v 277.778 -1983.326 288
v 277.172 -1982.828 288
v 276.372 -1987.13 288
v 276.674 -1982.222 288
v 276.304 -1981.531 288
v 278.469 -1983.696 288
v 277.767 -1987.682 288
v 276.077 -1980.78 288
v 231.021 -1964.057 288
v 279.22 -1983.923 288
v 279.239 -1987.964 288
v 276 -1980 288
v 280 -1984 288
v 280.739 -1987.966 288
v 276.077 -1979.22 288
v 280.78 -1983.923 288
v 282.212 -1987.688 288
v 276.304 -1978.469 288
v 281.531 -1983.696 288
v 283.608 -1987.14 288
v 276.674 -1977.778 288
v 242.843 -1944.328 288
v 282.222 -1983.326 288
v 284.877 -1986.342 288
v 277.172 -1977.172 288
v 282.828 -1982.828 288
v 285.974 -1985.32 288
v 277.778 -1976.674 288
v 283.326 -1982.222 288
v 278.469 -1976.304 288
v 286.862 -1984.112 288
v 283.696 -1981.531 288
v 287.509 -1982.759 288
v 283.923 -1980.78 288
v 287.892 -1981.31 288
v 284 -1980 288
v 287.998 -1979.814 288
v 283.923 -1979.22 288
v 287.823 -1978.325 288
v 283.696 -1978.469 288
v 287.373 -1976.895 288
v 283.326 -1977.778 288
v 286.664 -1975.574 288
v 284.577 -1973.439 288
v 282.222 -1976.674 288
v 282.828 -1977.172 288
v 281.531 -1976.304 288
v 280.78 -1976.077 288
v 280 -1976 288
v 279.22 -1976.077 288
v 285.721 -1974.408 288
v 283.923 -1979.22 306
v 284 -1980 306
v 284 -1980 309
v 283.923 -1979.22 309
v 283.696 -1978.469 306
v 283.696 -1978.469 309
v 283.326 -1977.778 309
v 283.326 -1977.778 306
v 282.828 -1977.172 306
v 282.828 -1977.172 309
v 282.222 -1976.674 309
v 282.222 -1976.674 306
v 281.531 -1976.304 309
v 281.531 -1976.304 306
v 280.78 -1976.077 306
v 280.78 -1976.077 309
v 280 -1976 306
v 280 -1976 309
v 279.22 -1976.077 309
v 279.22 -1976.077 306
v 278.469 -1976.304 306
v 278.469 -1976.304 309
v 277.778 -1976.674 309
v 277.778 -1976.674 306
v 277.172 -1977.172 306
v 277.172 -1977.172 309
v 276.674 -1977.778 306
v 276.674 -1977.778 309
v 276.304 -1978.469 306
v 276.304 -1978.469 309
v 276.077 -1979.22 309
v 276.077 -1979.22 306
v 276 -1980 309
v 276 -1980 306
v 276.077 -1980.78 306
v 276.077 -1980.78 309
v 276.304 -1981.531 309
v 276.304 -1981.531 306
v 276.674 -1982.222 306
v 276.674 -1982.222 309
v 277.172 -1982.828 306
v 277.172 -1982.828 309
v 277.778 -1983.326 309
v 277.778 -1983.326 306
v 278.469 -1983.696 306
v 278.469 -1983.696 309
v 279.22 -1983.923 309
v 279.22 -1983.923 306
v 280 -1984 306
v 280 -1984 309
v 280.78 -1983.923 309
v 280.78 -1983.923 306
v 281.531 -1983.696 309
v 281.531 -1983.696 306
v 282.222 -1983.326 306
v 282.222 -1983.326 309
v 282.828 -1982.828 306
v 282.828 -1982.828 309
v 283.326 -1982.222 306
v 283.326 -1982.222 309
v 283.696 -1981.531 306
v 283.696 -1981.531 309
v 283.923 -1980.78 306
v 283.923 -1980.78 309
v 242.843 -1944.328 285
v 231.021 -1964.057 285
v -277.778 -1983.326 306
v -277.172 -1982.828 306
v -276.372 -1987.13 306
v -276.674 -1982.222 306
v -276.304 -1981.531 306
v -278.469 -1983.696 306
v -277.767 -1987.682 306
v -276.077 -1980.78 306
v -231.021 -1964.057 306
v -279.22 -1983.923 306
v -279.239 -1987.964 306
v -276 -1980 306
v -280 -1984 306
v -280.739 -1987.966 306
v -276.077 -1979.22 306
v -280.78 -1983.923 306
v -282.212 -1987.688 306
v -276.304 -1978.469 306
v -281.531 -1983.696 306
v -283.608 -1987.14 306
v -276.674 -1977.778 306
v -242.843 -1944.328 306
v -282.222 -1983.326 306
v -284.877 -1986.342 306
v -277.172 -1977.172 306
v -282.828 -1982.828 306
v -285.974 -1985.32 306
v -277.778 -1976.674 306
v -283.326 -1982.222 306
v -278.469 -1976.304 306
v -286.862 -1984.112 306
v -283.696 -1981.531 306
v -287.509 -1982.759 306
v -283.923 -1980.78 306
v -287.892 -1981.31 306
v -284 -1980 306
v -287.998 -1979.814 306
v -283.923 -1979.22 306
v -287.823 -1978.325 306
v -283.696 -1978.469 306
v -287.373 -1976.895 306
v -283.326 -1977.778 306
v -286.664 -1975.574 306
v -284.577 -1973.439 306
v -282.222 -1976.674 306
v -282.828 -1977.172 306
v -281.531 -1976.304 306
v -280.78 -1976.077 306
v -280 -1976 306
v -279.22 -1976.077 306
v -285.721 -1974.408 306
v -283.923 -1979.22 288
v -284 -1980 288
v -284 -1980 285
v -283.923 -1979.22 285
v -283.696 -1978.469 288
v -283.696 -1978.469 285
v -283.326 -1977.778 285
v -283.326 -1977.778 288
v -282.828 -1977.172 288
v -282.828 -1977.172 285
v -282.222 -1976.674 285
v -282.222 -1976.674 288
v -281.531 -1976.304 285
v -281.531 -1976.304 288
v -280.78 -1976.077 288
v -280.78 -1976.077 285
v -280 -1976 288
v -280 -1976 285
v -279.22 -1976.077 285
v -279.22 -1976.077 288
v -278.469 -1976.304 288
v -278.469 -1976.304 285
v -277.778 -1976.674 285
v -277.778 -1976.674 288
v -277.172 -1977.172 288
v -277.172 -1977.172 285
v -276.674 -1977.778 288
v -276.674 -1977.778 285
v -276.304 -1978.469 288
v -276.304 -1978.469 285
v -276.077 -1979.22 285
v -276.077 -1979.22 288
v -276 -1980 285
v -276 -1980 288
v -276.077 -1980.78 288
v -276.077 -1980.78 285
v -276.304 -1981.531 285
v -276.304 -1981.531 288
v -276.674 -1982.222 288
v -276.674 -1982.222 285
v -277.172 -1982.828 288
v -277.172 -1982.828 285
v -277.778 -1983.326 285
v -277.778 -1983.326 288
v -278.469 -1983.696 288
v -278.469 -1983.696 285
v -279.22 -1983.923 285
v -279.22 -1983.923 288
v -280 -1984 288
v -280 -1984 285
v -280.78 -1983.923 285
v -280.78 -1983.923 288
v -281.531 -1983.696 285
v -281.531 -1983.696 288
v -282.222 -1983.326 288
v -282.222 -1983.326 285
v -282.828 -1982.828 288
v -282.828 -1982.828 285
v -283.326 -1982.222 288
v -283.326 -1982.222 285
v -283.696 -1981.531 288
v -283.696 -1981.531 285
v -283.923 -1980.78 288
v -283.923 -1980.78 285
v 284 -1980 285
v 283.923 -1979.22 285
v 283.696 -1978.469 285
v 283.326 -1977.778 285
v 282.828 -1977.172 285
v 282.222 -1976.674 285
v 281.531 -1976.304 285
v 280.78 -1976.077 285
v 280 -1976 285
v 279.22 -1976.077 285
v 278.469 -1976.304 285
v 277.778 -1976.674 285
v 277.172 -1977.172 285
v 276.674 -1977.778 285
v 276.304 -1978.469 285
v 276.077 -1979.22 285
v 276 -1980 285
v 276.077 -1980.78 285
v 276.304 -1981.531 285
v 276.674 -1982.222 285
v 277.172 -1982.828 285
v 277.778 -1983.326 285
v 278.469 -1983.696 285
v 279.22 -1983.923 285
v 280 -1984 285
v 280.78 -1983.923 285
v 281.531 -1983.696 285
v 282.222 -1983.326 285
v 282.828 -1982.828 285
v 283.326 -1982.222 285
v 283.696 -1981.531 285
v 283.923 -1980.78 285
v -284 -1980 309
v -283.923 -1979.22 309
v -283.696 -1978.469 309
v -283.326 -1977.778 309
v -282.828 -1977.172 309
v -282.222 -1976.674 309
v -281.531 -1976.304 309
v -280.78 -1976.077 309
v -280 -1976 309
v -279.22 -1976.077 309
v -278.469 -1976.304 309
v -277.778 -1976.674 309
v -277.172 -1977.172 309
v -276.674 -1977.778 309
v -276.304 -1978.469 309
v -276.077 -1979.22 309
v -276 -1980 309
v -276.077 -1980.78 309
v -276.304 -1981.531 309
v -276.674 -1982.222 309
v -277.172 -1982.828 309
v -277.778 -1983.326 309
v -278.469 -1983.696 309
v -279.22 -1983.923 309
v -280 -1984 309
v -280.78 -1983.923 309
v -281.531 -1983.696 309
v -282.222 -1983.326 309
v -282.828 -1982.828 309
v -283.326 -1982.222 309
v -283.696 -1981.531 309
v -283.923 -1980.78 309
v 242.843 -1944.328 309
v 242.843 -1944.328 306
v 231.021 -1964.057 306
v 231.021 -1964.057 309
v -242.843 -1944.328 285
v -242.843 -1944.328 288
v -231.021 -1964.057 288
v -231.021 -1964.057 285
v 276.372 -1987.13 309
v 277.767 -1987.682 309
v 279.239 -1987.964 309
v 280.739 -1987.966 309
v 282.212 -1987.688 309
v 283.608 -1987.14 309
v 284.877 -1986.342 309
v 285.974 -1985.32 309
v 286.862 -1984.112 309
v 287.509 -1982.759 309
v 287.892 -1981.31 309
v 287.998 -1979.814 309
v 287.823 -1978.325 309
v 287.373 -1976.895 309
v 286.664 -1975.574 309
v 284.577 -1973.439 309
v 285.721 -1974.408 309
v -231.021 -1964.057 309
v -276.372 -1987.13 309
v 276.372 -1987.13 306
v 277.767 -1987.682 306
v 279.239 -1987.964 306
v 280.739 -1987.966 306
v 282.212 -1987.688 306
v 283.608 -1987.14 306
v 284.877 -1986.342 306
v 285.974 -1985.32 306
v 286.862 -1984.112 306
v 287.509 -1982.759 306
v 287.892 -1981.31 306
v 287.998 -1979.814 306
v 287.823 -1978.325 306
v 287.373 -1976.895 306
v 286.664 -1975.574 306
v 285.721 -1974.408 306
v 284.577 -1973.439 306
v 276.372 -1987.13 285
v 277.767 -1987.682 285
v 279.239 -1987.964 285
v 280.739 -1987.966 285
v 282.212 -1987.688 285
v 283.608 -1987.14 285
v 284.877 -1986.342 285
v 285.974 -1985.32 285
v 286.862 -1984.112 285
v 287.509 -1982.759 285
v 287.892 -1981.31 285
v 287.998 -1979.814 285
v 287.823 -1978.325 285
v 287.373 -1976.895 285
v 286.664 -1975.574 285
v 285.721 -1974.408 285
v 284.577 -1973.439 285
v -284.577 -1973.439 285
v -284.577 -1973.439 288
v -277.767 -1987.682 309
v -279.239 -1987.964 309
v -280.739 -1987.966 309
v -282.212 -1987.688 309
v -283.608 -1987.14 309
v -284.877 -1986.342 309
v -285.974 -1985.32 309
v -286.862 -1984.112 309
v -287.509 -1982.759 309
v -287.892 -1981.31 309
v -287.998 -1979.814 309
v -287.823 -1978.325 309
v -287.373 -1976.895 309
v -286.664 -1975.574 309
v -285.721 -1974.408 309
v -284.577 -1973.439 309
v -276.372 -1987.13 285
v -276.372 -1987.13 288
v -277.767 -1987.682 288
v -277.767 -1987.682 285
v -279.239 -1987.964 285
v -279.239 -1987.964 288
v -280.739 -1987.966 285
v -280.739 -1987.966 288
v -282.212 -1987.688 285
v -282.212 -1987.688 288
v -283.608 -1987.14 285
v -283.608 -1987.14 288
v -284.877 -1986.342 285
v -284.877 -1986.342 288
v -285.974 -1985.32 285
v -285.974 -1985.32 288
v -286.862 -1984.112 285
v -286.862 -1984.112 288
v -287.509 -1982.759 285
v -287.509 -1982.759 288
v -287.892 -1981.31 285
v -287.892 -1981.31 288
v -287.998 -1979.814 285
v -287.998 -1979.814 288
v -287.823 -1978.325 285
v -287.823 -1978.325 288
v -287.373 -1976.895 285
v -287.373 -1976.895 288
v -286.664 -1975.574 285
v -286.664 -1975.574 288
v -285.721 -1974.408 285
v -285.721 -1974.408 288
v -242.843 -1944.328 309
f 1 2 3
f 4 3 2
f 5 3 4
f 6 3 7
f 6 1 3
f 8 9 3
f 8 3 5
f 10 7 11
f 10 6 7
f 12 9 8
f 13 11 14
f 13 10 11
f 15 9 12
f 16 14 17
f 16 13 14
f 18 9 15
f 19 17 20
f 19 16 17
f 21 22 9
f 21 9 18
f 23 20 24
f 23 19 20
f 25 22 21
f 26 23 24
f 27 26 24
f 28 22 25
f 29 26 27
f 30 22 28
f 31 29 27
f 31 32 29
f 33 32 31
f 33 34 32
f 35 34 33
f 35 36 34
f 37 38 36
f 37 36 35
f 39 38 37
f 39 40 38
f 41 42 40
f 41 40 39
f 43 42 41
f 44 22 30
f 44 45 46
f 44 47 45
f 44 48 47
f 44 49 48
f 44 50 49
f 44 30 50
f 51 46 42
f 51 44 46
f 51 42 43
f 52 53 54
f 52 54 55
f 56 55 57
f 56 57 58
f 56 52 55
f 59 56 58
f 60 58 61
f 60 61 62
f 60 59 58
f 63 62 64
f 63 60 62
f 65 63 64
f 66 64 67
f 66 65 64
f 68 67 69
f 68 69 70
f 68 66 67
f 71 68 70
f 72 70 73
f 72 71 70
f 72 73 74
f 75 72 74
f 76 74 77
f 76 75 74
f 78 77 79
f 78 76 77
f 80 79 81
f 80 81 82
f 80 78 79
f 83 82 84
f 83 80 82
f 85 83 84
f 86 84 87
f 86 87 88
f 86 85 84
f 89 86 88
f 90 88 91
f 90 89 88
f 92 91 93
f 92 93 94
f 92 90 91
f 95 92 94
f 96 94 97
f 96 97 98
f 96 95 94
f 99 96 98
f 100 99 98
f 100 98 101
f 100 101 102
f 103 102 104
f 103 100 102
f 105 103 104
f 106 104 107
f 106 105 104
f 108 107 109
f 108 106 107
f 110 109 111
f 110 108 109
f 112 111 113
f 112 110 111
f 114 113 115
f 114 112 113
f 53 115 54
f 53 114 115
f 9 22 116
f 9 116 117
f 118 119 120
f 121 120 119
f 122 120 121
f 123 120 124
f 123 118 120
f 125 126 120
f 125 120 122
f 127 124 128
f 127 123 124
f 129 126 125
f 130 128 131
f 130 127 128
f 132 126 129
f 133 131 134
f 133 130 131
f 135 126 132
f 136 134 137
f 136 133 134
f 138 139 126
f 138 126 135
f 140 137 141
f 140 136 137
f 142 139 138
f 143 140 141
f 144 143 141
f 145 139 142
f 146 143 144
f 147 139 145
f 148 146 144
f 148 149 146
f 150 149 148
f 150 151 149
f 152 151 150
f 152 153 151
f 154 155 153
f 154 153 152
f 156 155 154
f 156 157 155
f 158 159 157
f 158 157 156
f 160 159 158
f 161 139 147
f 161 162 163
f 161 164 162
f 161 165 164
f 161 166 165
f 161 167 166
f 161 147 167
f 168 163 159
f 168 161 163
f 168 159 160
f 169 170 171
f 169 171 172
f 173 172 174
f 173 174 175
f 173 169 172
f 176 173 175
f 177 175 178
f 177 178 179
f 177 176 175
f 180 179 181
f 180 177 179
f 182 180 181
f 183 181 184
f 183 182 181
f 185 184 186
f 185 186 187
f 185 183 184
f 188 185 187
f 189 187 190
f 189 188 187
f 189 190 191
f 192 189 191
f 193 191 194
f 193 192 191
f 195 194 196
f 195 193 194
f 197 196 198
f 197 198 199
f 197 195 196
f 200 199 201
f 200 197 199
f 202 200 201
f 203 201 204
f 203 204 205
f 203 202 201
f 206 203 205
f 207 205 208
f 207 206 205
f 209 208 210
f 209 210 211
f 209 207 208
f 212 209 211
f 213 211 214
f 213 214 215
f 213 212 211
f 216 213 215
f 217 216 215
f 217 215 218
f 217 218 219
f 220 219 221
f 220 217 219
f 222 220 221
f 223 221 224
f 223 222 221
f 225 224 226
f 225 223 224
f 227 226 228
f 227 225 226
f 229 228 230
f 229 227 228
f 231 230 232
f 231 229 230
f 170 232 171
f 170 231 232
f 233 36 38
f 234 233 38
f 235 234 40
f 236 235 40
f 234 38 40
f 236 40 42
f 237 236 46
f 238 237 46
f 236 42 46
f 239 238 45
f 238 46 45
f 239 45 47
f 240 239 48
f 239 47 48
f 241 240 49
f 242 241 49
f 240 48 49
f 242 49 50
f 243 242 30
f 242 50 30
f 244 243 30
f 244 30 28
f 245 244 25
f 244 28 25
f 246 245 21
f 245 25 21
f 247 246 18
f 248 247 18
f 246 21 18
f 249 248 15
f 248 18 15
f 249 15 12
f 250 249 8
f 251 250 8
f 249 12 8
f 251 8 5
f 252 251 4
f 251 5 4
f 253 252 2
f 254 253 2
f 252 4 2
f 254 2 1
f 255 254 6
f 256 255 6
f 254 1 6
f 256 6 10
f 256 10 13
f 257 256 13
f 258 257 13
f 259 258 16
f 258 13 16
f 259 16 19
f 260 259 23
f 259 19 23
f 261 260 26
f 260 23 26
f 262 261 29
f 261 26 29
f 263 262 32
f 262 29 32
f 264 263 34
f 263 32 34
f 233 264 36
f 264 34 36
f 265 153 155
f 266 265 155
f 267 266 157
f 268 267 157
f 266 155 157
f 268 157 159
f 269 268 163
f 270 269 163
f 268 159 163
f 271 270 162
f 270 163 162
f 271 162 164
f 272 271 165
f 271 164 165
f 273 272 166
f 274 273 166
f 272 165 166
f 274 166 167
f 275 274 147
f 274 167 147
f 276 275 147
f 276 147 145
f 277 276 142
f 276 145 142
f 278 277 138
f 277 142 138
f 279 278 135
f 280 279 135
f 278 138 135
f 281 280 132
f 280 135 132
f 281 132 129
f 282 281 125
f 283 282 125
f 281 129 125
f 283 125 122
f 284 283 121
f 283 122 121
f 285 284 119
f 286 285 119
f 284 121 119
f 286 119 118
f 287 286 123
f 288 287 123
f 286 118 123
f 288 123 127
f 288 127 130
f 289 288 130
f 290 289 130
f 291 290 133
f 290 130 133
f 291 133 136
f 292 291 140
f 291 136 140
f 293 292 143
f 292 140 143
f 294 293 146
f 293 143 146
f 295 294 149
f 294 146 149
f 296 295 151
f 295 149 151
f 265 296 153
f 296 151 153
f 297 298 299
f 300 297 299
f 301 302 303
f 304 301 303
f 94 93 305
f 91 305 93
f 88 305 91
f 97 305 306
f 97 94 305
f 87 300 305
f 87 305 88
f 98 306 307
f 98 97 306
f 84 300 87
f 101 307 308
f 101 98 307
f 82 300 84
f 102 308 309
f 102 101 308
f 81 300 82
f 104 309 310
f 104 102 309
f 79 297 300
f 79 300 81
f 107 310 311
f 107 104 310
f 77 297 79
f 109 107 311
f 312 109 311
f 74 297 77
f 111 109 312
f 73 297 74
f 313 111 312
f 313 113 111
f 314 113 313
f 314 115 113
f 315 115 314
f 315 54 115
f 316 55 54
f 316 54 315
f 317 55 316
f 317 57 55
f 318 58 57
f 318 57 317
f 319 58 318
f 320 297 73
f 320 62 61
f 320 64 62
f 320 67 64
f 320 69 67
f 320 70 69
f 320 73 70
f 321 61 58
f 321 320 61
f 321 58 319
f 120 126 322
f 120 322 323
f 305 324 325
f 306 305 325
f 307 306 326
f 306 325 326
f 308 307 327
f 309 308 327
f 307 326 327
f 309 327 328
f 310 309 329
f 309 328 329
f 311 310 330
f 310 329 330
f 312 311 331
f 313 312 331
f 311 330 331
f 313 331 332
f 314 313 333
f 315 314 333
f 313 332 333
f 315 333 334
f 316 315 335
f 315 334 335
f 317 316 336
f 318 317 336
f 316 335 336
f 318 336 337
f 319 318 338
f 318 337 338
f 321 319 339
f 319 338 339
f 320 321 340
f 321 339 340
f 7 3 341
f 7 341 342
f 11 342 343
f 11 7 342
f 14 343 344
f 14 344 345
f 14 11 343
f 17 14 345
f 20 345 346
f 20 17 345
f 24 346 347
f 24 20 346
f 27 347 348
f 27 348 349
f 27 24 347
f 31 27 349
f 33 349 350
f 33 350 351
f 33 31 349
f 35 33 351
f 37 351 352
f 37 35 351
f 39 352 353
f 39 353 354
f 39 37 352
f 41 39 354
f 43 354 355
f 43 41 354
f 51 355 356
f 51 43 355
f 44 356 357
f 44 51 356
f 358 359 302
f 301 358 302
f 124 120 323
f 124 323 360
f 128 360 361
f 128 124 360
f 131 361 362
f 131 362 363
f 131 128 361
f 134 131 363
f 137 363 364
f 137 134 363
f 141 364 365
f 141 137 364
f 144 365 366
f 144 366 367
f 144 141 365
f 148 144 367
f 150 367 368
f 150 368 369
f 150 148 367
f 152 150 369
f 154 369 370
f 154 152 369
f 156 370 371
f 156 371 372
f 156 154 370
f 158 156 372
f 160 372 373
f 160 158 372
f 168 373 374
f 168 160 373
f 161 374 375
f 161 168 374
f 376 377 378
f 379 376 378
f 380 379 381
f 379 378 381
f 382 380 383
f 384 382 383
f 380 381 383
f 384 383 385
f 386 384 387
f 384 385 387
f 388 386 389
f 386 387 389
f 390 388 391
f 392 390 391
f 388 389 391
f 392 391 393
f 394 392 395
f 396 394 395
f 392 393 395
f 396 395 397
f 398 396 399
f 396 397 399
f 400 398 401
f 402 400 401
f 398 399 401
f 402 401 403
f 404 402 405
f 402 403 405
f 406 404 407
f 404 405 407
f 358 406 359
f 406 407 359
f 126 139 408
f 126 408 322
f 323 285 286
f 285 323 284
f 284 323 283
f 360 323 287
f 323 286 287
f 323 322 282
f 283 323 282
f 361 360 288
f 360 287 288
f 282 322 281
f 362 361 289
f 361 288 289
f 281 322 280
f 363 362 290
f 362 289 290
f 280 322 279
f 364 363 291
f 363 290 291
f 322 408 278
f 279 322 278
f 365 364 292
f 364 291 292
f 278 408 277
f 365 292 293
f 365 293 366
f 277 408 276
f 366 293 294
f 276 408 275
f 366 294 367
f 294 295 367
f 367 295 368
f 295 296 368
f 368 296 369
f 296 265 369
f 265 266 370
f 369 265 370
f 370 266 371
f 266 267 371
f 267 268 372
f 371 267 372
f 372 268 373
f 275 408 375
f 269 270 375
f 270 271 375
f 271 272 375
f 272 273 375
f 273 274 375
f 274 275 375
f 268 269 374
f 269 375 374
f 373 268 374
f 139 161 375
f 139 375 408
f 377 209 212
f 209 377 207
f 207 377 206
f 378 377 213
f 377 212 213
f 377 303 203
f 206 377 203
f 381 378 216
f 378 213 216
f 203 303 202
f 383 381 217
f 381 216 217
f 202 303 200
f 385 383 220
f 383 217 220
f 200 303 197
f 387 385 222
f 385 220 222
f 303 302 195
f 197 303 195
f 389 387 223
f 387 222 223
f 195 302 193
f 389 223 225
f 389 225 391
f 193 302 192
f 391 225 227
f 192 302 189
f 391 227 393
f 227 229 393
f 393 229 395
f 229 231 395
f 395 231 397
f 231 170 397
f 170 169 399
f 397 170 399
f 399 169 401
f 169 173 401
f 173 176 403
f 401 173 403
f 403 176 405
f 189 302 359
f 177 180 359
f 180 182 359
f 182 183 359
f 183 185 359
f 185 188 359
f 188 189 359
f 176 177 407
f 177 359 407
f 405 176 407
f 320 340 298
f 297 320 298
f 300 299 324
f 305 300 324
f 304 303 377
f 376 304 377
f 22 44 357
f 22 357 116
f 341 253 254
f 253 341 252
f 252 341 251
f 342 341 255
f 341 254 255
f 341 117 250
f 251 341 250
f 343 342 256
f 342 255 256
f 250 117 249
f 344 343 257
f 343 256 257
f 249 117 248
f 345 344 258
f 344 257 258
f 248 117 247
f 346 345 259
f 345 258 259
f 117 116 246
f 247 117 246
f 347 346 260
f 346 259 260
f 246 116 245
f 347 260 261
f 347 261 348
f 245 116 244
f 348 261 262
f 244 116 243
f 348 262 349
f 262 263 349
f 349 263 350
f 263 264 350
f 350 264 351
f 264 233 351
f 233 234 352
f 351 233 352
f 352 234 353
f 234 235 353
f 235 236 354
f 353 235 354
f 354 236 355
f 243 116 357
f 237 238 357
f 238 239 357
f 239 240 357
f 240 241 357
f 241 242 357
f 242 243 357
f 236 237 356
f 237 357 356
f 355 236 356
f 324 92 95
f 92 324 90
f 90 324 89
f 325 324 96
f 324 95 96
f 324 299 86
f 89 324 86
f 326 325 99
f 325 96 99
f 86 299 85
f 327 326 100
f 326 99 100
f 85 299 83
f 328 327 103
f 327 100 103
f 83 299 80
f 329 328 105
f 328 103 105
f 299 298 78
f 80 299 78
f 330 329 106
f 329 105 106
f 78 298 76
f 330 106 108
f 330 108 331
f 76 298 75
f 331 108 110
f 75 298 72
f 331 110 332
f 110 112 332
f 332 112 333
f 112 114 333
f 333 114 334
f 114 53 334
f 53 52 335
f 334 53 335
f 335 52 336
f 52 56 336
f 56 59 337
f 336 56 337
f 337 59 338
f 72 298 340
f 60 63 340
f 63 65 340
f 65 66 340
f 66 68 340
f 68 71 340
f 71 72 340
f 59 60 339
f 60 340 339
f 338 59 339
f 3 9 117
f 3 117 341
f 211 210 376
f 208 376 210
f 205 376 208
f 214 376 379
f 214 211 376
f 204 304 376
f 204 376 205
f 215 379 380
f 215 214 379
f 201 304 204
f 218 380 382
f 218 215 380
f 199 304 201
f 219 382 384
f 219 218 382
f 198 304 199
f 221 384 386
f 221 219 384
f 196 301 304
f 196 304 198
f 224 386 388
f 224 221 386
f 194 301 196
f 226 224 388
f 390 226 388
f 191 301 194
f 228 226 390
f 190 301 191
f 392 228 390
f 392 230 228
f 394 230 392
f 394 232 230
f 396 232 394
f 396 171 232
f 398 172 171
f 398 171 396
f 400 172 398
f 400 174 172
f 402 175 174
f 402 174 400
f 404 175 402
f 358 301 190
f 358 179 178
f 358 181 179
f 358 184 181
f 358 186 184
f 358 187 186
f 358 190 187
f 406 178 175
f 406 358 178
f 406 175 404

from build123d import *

# Parameters (mm, degrees)
BOSS_EXTRUDE1_START     = 306
BOSS_EXTRUDE1_OUTLINE_R = 4
BOSS_EXTRUDE1_DEPTH     = 3


# Read off the part's stored shape, not the designer's step: Boss-Extrude1
with BuildPart() as part:
    # Boss-Extrude1 outline → Boss-Extrude1 (new body)
    with BuildSketch(Plane.XY.offset(BOSS_EXTRUDE1_START)):
        with BuildLine():
            Line((242.843334981, -1944.327717242), (231.021017413, -1964.056701182))
            Line((231.021017413, -1964.056701182), (276.372336791, -1987.13022157))
            ThreePointArc((276.372336791, -1987.13022157), (286.862255284, -1984.112110459), (284.576864871, -1973.438574244))
            Line((284.576864871, -1973.438574244), (242.843334981, -1944.327717242))
        make_face()
        with Locations((280, -1980)):
            Circle(BOSS_EXTRUDE1_OUTLINE_R, mode=Mode.SUBTRACT)
    extrude(amount=BOSS_EXTRUDE1_DEPTH)


with BuildPart() as body_2:
    # Mirror1: mirrored copy
    add(part.part.mirror(Plane(origin=(0, 0, 297), x_dir=(1, 0, 0), z_dir=(0, 0, -1))))


with BuildPart() as body_3:
    # Mirror2: mirrored copy
    add(part.part.mirror(Plane(origin=(0, 0, 0), x_dir=(0, 0, 1), z_dir=(1, 0, 0))))


with BuildPart() as body_4:
    # Mirror2 2: mirrored copy
    add(body_2.part.mirror(Plane(origin=(0, 0, 0), x_dir=(0, 0, 1), z_dir=(1, 0, 0))))


solid = Compound([part.part, body_2.part, body_3.part, body_4.part])
